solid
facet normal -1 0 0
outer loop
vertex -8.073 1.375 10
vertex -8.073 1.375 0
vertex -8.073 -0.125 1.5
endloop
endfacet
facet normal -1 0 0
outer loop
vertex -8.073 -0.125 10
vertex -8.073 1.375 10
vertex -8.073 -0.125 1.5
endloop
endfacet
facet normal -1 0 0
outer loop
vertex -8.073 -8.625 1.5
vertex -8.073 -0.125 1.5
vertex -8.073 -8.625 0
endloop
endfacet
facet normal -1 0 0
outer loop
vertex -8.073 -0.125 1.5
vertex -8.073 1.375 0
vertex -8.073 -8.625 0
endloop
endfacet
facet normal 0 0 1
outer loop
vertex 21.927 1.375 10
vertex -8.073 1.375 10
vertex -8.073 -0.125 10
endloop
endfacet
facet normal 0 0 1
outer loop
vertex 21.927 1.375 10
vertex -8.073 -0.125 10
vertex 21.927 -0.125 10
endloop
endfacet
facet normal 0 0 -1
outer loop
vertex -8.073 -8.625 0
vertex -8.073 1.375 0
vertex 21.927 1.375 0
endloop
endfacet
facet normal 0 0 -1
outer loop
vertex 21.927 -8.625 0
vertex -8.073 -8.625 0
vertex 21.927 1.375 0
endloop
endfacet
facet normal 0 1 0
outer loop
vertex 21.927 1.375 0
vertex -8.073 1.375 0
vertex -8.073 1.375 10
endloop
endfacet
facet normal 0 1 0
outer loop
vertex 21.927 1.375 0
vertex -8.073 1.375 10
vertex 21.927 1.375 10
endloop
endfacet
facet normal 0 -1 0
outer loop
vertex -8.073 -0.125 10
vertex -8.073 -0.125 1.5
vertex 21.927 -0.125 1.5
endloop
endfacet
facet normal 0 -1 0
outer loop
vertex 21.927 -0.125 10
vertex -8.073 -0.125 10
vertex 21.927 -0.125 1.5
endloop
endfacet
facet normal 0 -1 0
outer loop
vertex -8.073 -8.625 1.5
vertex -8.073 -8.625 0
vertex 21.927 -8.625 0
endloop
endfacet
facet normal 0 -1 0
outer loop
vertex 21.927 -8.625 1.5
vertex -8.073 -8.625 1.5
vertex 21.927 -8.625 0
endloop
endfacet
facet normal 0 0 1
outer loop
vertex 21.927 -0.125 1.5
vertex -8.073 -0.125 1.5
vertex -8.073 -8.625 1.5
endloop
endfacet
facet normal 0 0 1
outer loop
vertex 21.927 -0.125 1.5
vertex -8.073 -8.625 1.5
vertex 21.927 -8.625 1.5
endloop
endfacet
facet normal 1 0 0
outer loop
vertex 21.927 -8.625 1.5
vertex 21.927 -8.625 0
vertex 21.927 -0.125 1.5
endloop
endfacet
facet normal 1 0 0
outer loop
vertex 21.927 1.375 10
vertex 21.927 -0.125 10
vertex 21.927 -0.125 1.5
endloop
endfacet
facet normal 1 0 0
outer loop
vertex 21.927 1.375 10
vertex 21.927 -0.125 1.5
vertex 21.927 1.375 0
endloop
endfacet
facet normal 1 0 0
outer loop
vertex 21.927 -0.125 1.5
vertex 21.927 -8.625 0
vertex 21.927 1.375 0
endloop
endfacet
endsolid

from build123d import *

# Parameters (mm, degrees)
F0_W     = 30
F0_H     = 1.5
F0_H_2   = 8.5
F1_DEPTH = 1.5
F2_DEPTH = 10


with BuildPart() as f1:
    # F0 (on Top) → F1 (new body)
    with BuildSketch(Plane.XY):
        with Locations((6.926514, 0.62533)):
            Rectangle(F0_W, F0_H)
        with Locations((6.926514, -4.37467)):
            Rectangle(F0_W, F0_H_2)
    extrude(amount=F1_DEPTH)

    # F0 (on Top) → F2 (join)
    with BuildSketch(Plane.XY):
        with Locations((6.926514, 0.62533)):
            Rectangle(F0_W, F0_H)
    extrude(amount=F2_DEPTH)


solid = f1.part
